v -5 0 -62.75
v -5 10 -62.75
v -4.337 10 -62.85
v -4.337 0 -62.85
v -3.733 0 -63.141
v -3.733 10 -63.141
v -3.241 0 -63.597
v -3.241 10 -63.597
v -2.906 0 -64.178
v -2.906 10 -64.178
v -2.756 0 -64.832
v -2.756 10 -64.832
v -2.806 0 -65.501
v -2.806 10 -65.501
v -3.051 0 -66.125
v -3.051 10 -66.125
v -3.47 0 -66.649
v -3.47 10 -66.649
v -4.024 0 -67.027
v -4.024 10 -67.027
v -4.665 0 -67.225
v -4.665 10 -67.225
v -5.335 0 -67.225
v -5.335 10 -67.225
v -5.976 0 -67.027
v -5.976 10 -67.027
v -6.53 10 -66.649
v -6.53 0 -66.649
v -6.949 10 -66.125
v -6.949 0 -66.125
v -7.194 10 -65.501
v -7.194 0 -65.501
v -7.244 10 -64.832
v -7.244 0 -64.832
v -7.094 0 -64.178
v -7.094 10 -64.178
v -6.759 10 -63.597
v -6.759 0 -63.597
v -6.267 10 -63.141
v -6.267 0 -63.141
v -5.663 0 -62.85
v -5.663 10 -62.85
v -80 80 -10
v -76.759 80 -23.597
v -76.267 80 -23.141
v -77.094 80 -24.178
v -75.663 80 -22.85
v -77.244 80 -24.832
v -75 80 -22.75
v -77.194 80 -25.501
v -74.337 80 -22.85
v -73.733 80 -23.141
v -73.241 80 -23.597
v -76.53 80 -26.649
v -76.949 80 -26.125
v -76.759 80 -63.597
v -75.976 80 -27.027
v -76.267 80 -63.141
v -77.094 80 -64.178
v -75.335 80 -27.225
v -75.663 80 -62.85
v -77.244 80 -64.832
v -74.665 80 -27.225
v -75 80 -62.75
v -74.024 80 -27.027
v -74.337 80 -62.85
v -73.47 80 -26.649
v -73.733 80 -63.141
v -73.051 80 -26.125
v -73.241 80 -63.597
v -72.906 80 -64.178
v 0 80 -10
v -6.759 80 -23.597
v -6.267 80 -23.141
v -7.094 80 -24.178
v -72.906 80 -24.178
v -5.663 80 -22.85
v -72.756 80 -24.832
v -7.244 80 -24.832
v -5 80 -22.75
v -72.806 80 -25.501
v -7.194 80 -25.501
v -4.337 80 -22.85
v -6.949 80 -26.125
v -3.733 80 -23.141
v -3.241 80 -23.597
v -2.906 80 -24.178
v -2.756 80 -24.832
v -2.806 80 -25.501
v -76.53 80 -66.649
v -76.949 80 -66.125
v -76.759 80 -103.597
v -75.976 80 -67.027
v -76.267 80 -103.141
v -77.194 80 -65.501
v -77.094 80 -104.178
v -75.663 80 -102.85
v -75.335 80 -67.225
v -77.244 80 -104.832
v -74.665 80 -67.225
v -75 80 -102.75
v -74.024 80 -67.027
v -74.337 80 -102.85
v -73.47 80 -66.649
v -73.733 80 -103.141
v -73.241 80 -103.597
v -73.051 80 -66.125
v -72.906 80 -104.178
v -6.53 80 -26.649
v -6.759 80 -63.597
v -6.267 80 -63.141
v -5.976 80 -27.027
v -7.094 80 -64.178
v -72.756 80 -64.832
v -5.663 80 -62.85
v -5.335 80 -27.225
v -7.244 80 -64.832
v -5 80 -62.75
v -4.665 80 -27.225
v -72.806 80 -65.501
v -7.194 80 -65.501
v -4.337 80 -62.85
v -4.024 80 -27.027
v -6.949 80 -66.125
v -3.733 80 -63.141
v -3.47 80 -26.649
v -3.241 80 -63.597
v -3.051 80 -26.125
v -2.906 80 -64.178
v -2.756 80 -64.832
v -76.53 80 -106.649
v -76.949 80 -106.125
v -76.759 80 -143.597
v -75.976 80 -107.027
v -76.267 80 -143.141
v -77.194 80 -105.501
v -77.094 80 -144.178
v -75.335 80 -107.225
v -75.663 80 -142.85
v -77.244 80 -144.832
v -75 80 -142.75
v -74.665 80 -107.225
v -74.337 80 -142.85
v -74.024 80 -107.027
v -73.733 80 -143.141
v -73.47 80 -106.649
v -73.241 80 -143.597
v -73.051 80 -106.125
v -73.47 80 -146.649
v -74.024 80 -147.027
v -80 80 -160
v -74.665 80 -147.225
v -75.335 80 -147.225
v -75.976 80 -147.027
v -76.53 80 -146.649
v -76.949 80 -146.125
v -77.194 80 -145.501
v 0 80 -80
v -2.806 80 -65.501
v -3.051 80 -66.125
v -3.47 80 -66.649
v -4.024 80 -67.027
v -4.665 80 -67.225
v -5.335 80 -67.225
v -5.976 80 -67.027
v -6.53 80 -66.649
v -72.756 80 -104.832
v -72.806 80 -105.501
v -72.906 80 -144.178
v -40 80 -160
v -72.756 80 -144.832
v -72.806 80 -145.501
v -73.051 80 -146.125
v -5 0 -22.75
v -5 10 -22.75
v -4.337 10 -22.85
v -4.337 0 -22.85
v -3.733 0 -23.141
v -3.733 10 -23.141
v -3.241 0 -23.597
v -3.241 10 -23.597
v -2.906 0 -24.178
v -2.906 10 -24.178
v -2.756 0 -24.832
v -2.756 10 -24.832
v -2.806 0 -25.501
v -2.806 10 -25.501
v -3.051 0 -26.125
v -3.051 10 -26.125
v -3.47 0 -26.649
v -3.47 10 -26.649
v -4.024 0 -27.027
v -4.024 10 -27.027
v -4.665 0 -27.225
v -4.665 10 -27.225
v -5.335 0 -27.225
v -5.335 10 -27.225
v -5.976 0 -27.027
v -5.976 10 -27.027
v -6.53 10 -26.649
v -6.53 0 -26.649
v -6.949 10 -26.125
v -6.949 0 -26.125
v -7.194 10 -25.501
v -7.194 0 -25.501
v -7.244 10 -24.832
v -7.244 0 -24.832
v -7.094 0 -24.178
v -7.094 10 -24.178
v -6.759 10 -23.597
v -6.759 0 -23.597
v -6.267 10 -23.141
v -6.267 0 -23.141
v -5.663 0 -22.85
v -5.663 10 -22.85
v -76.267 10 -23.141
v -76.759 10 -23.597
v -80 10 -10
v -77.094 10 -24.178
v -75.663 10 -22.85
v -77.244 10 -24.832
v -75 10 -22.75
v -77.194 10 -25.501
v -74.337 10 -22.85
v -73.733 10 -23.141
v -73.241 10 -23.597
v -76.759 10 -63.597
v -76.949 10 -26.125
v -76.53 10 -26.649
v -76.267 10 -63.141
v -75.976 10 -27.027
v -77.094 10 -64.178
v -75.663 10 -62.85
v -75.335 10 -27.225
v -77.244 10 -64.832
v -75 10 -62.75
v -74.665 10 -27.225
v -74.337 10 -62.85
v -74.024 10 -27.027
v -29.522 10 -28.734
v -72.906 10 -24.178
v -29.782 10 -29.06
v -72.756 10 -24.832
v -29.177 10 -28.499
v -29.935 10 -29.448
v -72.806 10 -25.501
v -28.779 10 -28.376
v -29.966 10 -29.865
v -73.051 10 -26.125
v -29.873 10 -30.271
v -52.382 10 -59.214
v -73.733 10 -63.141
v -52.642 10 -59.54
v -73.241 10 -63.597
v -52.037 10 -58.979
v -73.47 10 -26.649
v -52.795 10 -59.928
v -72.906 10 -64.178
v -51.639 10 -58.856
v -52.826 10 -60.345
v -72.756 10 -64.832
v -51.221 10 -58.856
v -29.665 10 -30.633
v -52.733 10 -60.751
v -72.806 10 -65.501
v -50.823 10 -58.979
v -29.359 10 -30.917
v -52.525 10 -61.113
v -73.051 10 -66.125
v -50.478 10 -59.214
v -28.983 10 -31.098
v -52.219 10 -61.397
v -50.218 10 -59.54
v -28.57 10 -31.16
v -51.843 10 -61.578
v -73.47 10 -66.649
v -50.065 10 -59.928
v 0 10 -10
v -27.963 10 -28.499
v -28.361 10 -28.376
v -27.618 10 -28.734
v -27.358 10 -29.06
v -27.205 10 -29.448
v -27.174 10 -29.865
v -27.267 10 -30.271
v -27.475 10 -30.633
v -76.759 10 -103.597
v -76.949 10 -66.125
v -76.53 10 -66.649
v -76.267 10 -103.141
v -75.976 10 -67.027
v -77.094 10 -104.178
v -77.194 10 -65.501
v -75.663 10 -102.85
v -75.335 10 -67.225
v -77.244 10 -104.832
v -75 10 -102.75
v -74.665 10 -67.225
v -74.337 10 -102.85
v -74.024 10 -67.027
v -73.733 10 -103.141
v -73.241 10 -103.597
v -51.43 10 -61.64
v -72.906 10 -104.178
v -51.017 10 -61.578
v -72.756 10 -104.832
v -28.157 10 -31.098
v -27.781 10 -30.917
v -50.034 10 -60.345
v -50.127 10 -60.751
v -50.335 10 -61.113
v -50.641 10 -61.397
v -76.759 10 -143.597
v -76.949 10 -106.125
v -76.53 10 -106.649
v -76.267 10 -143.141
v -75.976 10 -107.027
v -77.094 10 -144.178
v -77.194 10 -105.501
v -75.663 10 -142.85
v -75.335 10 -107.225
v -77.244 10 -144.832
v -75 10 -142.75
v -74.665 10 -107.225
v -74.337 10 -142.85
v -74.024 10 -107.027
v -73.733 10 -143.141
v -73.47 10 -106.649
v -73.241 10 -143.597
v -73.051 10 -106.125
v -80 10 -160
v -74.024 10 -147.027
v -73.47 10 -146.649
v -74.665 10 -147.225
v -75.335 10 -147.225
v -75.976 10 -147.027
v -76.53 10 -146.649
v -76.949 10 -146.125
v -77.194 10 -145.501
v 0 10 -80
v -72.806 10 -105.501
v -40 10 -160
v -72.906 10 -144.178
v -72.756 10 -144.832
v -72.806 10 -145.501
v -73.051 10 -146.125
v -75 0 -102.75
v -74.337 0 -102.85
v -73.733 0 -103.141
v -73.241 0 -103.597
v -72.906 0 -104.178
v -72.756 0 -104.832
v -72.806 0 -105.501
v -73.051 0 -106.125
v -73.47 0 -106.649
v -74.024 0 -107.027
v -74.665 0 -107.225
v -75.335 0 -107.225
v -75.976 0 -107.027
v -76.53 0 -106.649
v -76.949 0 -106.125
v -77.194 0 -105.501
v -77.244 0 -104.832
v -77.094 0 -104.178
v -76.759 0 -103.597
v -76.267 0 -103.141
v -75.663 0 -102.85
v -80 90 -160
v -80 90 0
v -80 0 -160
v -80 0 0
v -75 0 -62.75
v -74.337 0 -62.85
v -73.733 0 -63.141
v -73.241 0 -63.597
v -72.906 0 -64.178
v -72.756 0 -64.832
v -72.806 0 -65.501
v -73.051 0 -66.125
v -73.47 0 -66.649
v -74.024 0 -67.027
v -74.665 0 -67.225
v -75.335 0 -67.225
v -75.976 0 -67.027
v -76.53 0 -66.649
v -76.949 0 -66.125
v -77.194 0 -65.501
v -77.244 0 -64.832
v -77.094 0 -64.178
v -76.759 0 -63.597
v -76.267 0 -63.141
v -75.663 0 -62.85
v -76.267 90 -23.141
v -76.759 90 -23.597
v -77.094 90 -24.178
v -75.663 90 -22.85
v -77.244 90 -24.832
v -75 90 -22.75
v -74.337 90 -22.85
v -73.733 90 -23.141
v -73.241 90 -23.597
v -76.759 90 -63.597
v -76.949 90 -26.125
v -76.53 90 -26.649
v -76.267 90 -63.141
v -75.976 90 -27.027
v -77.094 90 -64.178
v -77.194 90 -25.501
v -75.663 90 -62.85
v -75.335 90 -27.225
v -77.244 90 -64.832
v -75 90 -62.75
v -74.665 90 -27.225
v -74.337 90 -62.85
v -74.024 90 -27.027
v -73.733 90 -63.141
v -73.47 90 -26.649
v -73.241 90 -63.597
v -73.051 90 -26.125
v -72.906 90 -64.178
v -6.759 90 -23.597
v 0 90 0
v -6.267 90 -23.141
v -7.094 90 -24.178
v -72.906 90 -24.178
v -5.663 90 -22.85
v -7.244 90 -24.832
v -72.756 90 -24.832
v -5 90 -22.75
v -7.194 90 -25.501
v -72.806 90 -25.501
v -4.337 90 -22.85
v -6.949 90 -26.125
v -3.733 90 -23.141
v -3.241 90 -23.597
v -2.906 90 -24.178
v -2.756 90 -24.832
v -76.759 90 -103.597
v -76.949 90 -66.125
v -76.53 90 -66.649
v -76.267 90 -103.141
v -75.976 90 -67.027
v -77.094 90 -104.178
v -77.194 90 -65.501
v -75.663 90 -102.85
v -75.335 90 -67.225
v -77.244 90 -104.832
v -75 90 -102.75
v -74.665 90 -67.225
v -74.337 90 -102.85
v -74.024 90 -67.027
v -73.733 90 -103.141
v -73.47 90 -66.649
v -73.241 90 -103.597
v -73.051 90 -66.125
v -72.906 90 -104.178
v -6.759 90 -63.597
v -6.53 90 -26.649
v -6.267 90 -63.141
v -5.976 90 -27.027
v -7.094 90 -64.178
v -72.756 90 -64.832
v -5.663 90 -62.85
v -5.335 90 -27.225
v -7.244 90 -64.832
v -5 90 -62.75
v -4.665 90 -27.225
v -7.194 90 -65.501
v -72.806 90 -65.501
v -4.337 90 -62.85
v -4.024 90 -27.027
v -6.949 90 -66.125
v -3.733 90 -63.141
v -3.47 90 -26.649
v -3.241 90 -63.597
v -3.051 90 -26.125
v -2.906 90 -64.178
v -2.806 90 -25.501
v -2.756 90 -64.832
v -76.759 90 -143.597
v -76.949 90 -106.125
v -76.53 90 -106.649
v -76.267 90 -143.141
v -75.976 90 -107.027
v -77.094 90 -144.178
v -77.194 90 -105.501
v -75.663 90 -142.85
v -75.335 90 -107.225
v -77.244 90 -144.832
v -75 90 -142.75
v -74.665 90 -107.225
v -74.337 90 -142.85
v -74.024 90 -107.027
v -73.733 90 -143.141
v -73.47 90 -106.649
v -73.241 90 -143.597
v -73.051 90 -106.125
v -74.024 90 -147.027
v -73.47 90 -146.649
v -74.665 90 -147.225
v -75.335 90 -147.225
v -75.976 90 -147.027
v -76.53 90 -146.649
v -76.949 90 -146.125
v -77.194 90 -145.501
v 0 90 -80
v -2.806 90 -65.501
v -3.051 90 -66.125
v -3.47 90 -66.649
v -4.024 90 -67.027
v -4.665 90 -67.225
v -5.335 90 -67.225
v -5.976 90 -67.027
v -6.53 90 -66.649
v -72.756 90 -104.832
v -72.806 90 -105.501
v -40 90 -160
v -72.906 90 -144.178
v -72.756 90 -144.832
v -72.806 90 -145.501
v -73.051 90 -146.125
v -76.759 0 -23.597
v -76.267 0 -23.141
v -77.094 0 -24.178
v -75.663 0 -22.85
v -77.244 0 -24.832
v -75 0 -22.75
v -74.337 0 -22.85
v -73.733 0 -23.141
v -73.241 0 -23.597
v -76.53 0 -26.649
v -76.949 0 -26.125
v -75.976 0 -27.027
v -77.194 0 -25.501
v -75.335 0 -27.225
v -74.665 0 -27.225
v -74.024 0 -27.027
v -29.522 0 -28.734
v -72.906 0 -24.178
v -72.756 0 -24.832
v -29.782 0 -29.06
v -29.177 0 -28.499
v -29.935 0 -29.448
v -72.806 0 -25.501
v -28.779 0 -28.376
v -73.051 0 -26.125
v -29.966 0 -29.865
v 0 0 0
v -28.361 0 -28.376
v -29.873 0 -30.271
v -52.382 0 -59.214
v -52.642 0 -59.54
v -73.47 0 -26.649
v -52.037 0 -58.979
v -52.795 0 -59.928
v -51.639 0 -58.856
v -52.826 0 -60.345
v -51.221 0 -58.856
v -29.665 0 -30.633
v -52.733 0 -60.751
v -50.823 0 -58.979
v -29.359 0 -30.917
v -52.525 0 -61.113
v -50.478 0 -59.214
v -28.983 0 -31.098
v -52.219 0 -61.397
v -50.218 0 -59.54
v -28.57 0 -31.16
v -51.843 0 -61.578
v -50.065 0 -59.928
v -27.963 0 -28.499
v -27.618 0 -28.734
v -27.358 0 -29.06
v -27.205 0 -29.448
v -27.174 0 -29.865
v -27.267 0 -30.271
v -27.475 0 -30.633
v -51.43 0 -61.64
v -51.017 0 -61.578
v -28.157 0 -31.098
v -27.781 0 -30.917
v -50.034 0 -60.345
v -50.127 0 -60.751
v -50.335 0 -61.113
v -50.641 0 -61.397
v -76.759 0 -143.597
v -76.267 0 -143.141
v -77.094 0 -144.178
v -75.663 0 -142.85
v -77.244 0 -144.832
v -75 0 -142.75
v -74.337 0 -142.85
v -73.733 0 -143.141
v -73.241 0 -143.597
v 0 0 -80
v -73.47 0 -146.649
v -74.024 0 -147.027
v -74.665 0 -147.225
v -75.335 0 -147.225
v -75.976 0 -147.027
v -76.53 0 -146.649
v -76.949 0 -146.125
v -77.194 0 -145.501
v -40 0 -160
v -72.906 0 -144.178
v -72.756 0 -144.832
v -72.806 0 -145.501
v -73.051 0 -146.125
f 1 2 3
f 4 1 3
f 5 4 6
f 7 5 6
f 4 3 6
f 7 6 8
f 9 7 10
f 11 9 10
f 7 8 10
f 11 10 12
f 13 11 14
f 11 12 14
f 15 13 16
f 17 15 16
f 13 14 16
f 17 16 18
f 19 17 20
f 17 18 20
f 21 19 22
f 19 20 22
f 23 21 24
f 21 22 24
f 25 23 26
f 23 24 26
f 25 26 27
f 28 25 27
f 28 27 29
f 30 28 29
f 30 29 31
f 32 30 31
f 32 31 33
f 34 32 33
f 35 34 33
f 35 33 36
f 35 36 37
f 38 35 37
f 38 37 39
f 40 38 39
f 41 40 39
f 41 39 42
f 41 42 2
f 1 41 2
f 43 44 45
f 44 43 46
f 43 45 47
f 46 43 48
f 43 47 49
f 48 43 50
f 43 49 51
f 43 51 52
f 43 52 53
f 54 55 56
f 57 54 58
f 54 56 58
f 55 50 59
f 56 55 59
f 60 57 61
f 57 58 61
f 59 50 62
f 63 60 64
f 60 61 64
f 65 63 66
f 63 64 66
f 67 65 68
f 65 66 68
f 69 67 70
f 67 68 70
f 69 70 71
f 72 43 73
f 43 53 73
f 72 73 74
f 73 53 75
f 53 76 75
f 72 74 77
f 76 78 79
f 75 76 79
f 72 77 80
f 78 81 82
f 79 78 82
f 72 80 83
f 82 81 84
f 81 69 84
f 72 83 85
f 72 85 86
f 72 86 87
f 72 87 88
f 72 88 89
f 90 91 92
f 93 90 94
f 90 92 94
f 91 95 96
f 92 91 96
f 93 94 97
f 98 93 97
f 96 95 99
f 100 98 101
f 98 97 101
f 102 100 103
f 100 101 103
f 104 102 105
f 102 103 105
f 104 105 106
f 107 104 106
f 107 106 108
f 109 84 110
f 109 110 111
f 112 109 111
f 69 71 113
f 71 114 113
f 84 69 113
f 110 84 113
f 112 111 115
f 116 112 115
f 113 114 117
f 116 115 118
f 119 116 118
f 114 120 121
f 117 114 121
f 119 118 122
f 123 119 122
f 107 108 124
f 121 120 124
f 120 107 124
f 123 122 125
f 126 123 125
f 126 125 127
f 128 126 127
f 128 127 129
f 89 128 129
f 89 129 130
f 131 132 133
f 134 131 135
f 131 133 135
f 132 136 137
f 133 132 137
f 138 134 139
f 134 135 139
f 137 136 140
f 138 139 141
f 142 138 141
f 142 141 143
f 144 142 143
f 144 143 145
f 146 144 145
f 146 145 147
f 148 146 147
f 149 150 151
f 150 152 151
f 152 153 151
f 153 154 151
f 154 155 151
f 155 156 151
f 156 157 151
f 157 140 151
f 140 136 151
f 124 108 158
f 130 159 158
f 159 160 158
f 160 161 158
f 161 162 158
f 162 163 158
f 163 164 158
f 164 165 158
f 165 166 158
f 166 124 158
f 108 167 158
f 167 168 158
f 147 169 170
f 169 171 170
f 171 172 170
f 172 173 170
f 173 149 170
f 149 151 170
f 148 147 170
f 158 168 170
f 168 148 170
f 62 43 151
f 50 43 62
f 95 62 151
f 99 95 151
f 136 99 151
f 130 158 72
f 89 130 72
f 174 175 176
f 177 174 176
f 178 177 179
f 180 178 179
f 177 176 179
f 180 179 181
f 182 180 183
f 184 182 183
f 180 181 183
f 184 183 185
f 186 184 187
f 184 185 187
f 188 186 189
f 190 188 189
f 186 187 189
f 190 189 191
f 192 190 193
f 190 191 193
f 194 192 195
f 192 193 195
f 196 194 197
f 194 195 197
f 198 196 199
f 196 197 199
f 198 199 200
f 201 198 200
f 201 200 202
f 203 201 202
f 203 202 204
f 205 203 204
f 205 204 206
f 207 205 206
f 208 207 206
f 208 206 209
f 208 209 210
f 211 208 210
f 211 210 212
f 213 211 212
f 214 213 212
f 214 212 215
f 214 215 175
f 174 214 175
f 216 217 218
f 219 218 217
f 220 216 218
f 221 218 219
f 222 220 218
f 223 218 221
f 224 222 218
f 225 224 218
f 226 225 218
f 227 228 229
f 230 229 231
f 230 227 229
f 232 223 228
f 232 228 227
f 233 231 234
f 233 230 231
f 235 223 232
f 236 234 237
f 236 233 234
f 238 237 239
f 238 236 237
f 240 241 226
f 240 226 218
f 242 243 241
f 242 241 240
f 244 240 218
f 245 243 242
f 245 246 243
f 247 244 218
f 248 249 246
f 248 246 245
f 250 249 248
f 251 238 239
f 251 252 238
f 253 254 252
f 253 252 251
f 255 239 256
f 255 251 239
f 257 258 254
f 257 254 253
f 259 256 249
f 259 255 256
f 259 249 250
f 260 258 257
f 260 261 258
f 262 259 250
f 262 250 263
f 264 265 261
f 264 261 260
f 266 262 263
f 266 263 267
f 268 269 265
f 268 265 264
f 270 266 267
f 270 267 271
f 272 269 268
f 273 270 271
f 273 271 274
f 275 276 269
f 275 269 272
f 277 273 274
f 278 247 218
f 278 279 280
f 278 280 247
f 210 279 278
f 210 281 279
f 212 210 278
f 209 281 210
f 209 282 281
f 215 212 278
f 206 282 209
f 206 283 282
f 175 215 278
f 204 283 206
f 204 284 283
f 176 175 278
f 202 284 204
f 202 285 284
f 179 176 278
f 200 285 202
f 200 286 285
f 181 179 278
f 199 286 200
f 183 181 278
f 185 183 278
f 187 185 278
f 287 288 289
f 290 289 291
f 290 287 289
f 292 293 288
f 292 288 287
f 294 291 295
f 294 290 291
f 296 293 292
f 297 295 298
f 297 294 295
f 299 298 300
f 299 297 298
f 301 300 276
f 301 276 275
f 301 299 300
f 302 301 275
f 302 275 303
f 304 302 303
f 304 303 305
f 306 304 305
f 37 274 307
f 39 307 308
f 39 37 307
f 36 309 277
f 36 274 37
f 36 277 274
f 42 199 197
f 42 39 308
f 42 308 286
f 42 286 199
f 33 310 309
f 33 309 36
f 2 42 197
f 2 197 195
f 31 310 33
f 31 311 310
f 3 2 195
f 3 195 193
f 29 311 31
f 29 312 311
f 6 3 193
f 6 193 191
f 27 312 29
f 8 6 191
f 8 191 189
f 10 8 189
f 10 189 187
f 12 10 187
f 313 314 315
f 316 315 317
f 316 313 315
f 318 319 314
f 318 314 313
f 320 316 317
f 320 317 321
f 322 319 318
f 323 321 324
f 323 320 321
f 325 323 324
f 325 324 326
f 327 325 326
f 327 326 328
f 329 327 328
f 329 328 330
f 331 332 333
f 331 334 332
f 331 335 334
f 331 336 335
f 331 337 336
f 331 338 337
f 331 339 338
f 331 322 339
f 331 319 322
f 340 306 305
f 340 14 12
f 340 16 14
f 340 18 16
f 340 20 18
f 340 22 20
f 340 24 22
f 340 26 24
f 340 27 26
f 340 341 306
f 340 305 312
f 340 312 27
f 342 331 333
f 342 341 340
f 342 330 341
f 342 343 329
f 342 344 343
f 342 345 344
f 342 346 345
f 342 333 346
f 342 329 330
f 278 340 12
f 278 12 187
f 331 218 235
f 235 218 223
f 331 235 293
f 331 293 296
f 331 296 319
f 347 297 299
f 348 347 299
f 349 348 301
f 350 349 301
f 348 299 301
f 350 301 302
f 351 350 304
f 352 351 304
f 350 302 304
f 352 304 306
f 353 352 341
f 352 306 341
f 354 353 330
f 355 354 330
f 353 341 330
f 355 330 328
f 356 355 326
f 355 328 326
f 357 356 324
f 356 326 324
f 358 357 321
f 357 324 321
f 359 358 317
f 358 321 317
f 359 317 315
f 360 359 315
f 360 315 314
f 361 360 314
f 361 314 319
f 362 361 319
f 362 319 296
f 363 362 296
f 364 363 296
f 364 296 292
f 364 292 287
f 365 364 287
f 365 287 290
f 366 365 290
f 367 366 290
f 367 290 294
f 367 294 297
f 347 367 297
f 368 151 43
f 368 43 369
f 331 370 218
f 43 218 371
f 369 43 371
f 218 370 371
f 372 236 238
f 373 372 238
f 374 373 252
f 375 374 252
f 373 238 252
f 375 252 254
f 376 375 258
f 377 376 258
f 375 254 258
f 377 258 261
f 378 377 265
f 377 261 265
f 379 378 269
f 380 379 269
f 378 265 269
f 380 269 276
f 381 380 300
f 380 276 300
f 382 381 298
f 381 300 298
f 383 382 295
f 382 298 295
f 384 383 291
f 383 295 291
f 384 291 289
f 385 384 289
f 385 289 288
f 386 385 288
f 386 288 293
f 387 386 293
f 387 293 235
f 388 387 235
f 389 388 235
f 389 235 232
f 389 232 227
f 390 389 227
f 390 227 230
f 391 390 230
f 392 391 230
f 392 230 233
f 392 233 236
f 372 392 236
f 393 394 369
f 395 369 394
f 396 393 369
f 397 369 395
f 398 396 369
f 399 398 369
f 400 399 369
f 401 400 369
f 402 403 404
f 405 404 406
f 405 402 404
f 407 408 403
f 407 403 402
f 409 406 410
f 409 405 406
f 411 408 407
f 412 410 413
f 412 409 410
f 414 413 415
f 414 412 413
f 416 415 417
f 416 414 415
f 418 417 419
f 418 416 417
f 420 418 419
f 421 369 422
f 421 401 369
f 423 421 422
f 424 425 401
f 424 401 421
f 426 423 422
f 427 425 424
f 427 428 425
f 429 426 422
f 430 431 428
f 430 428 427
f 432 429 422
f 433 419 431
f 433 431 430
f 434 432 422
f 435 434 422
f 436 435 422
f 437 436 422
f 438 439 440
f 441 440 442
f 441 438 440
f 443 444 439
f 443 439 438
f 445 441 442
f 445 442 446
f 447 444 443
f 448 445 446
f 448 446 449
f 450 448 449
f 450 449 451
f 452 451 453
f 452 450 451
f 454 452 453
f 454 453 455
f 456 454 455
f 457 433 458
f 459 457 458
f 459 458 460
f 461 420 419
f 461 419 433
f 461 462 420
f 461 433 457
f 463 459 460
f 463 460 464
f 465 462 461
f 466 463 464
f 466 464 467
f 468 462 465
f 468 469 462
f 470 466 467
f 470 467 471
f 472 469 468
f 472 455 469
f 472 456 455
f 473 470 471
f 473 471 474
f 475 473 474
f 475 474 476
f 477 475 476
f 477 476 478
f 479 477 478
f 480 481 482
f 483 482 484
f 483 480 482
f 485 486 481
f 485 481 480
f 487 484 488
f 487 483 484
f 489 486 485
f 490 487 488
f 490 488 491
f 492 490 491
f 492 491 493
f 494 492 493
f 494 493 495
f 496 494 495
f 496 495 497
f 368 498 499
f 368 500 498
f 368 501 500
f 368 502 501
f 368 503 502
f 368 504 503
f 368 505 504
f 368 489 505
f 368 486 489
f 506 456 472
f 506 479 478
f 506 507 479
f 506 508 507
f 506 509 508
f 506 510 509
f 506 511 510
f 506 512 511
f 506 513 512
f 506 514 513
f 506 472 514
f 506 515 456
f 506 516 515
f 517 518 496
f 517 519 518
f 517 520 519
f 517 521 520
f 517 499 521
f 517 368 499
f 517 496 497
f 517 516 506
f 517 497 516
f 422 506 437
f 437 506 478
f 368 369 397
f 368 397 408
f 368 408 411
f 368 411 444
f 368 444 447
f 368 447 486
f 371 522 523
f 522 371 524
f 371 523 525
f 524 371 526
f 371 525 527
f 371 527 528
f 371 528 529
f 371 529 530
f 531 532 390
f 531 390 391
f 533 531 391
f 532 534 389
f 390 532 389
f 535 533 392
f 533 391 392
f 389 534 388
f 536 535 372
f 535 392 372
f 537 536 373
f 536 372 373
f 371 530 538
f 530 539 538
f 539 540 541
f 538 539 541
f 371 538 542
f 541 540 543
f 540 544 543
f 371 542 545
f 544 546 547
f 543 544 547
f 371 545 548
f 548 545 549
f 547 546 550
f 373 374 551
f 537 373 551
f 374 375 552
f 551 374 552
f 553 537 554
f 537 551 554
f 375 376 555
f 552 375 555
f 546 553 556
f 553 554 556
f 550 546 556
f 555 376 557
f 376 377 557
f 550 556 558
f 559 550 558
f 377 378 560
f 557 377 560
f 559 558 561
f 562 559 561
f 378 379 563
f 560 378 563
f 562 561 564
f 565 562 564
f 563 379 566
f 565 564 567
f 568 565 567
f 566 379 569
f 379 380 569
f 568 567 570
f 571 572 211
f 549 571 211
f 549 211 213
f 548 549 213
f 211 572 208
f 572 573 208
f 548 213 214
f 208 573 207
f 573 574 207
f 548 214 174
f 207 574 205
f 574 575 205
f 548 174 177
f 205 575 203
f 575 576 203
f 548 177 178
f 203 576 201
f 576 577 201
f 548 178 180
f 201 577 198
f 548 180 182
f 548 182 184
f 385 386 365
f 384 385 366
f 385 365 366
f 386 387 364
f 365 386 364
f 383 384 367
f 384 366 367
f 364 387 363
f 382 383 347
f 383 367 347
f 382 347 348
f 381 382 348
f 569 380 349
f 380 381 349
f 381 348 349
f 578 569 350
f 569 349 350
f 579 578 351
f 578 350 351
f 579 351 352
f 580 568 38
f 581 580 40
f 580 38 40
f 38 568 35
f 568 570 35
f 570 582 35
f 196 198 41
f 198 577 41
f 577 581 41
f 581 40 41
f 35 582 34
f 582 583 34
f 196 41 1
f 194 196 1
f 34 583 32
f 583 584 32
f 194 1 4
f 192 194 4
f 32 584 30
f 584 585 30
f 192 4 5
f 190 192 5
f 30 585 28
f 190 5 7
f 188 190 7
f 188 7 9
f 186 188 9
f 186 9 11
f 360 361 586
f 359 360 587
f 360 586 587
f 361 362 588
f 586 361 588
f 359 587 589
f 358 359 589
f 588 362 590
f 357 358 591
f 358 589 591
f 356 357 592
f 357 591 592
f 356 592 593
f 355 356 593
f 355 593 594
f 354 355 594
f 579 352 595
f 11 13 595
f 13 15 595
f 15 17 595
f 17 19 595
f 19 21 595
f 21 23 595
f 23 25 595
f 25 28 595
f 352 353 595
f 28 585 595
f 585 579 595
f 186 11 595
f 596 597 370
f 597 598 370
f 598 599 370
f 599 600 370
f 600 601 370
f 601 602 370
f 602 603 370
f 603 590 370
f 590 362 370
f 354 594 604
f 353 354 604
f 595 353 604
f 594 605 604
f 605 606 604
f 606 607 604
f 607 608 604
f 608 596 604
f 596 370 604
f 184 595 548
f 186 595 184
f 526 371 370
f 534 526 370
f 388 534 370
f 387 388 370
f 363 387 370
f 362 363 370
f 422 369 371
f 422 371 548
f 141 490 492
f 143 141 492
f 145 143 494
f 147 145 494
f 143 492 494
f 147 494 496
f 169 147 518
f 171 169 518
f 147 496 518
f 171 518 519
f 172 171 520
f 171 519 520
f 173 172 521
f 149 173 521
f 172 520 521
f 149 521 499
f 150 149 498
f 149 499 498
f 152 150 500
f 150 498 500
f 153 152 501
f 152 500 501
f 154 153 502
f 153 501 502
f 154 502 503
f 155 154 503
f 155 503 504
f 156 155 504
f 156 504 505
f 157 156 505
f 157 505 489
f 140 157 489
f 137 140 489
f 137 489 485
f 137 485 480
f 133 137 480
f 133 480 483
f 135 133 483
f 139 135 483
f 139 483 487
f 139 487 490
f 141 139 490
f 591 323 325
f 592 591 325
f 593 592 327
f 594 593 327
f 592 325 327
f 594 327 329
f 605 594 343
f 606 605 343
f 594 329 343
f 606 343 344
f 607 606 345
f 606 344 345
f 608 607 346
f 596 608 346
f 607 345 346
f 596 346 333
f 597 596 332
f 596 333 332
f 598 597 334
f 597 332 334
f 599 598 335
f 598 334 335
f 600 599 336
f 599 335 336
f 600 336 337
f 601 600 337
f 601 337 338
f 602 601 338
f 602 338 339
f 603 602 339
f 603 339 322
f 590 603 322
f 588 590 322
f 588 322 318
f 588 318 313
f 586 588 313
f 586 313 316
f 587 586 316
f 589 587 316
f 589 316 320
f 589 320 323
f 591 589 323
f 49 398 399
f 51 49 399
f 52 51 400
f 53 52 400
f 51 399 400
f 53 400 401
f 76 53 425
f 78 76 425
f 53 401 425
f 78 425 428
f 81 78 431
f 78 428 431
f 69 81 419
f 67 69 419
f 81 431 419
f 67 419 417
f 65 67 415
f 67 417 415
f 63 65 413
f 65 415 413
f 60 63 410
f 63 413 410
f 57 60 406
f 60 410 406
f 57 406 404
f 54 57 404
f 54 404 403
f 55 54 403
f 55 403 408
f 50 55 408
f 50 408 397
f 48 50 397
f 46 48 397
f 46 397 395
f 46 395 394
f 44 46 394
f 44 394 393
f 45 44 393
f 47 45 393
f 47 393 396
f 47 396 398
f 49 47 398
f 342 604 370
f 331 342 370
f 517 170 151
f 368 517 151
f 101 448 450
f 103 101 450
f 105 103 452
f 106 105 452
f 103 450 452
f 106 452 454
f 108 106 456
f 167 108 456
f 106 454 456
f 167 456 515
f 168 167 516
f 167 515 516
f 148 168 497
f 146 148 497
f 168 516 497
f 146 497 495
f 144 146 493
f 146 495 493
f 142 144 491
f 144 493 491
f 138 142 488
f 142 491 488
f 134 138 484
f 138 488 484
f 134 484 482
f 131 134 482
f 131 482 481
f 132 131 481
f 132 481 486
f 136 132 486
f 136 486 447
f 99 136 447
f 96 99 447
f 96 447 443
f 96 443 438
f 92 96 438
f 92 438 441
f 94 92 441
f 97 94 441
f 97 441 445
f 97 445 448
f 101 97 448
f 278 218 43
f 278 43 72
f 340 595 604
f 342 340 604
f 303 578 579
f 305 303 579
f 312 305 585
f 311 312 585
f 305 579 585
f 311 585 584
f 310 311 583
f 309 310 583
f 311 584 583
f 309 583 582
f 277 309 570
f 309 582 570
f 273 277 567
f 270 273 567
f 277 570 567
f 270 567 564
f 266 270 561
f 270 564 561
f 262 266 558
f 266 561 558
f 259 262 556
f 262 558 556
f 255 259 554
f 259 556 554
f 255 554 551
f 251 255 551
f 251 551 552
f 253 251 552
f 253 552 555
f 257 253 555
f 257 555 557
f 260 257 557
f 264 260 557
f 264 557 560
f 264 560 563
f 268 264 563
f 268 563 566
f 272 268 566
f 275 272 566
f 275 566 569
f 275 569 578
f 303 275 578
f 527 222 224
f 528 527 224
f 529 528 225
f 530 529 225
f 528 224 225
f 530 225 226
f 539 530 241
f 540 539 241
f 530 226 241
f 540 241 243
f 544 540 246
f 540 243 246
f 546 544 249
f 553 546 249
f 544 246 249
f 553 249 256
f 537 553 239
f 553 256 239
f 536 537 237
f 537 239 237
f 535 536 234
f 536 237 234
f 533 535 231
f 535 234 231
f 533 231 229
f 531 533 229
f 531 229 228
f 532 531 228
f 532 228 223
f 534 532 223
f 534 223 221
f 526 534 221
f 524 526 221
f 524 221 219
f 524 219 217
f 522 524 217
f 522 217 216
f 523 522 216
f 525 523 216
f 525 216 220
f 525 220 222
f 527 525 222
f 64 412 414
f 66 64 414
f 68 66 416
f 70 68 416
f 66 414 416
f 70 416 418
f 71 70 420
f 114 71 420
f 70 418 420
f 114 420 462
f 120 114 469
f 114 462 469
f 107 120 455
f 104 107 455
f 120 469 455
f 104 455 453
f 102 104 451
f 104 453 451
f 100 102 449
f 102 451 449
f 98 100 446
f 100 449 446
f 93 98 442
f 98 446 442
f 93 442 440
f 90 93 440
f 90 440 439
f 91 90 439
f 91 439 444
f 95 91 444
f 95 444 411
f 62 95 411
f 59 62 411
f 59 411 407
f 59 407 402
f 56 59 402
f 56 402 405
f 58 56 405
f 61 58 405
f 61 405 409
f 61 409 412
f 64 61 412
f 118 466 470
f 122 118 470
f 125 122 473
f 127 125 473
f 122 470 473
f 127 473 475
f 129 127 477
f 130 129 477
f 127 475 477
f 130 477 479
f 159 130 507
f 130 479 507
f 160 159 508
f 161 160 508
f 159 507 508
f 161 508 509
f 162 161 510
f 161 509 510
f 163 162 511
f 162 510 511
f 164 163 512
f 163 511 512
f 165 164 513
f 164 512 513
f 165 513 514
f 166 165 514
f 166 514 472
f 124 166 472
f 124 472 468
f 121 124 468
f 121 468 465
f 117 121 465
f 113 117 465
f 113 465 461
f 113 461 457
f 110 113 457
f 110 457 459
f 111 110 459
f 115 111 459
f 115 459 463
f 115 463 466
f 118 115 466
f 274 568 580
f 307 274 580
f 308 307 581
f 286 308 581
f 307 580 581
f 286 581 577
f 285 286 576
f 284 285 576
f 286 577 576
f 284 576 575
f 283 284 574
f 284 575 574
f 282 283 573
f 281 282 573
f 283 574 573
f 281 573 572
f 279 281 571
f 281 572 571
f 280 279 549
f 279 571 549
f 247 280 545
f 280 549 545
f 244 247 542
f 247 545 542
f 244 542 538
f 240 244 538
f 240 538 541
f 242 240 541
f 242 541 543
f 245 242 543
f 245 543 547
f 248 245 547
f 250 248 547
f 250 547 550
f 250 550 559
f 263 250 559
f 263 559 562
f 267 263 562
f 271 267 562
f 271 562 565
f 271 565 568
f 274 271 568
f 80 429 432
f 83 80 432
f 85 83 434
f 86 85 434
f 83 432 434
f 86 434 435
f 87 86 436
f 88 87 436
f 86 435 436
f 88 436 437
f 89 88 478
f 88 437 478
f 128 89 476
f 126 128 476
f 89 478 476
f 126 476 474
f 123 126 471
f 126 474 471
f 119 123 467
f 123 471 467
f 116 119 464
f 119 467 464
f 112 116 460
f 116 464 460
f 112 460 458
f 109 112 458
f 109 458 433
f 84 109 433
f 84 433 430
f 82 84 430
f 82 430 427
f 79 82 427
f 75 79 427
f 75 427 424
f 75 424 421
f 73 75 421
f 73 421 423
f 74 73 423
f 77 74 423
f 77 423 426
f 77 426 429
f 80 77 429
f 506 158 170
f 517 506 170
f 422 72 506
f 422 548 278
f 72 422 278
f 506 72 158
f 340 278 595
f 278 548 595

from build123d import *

# Parameters (mm, degrees)
SALIENTE_EXTRUIR1_DEPTH = 10
CROQUIS2_W              = 80
CROQUIS2_H              = 10
SALIENTE_EXTRUIR2_DEPTH = 70
SALIENTE_EXTRUIR3_DEPTH = 10
CROQUIS4_R              = 2.25
CORTAR_EXTRUIR1_DEPTH   = 201.249843945
CORTAR_EXTRUIR2_REACH   = 202.25
CROQUIS5_R              = 1.4


with BuildPart() as part:
    # Croquis1 → Saliente-Extruir1 (new body)
    with BuildSketch(Plane(origin=(0, 0, 0), x_dir=(1, 0, 0), z_dir=(0, 1, 0))):
        Polygon((0, 0), (0, 80), (-40, 160), (-80, 160), (-80, 0), align=None)
    extrude(amount=SALIENTE_EXTRUIR1_DEPTH)

    # Croquis2 → Saliente-Extruir2 (add)
    with BuildSketch(Plane(origin=(0, 10, 0), x_dir=(1, 0, 0), z_dir=(0, 1, 0))):
        with Locations((-40, 5)):
            Rectangle(CROQUIS2_W, CROQUIS2_H)
    extrude(amount=SALIENTE_EXTRUIR2_DEPTH)

    # Croquis3 → Saliente-Extruir3 (add)
    with BuildSketch(Plane(origin=(0, 80, 0), x_dir=(1, 0, 0), z_dir=(0, 1, 0))):
        Polygon((-80, 0), (0, 0), (0, 80), (-40, 160), (-80, 160), align=None)
    extrude(amount=SALIENTE_EXTRUIR3_DEPTH)

    # Croquis4 → Cortar-Extruir1 (cut, through all)
    with BuildSketch(Plane(origin=(0, 90, 0), x_dir=(1, 0, 0), z_dir=(0, 1, 0))):
        with Locations(Location((-75, 25, 0), (0, 0, 270))):
            Circle(CROQUIS4_R)
        with Locations(Location((-5, 25, 0), (0, 0, 270))):
            Circle(CROQUIS4_R)
        with Locations(Location((-5, 65, 0), (0, 0, 270))):
            Circle(CROQUIS4_R)
        with Locations(Location((-75, 65, 0), (0, 0, 270))):
            Circle(CROQUIS4_R)
        with Locations(Location((-75, 145, 0), (0, 0, 270))):
            Circle(CROQUIS4_R)
        with Locations(Location((-75, 105, 0), (0, 0, 270))):
            Circle(CROQUIS4_R)
    extrude(amount=-CORTAR_EXTRUIR1_DEPTH, mode=Mode.SUBTRACT)

    # Croquis5 → Cortar-Extruir2 (cut, up to next)
    with BuildSketch(Plane.XZ, mode=Mode.PRIVATE) as cortar_extruir2_sk1:
        with Locations(Location((-28.57, -29.76, 0), (0, 0, 270))):
            Circle(CROQUIS5_R)
    cortar_extruir2_tool1 = extrude(cortar_extruir2_sk1.sketch, amount=-CORTAR_EXTRUIR2_REACH, mode=Mode.PRIVATE) & part.part
    # Croquis5 → Cortar-Extruir2 (cut, up to next)
    with BuildSketch(Plane.XZ, mode=Mode.PRIVATE) as cortar_extruir2_sk2:
        with Locations(Location((-51.43, -60.24, 0), (0, 0, 270))):
            Circle(CROQUIS5_R)
    cortar_extruir2_tool2 = extrude(cortar_extruir2_sk2.sketch, amount=-CORTAR_EXTRUIR2_REACH, mode=Mode.PRIVATE) & part.part
    add(cortar_extruir2_tool1.solids().sort_by_distance((-28.57, 0, -29.76))[0], mode=Mode.SUBTRACT)
    add(cortar_extruir2_tool2.solids().sort_by_distance((-51.43, 0, -60.24))[0], mode=Mode.SUBTRACT)


solid = part.part
